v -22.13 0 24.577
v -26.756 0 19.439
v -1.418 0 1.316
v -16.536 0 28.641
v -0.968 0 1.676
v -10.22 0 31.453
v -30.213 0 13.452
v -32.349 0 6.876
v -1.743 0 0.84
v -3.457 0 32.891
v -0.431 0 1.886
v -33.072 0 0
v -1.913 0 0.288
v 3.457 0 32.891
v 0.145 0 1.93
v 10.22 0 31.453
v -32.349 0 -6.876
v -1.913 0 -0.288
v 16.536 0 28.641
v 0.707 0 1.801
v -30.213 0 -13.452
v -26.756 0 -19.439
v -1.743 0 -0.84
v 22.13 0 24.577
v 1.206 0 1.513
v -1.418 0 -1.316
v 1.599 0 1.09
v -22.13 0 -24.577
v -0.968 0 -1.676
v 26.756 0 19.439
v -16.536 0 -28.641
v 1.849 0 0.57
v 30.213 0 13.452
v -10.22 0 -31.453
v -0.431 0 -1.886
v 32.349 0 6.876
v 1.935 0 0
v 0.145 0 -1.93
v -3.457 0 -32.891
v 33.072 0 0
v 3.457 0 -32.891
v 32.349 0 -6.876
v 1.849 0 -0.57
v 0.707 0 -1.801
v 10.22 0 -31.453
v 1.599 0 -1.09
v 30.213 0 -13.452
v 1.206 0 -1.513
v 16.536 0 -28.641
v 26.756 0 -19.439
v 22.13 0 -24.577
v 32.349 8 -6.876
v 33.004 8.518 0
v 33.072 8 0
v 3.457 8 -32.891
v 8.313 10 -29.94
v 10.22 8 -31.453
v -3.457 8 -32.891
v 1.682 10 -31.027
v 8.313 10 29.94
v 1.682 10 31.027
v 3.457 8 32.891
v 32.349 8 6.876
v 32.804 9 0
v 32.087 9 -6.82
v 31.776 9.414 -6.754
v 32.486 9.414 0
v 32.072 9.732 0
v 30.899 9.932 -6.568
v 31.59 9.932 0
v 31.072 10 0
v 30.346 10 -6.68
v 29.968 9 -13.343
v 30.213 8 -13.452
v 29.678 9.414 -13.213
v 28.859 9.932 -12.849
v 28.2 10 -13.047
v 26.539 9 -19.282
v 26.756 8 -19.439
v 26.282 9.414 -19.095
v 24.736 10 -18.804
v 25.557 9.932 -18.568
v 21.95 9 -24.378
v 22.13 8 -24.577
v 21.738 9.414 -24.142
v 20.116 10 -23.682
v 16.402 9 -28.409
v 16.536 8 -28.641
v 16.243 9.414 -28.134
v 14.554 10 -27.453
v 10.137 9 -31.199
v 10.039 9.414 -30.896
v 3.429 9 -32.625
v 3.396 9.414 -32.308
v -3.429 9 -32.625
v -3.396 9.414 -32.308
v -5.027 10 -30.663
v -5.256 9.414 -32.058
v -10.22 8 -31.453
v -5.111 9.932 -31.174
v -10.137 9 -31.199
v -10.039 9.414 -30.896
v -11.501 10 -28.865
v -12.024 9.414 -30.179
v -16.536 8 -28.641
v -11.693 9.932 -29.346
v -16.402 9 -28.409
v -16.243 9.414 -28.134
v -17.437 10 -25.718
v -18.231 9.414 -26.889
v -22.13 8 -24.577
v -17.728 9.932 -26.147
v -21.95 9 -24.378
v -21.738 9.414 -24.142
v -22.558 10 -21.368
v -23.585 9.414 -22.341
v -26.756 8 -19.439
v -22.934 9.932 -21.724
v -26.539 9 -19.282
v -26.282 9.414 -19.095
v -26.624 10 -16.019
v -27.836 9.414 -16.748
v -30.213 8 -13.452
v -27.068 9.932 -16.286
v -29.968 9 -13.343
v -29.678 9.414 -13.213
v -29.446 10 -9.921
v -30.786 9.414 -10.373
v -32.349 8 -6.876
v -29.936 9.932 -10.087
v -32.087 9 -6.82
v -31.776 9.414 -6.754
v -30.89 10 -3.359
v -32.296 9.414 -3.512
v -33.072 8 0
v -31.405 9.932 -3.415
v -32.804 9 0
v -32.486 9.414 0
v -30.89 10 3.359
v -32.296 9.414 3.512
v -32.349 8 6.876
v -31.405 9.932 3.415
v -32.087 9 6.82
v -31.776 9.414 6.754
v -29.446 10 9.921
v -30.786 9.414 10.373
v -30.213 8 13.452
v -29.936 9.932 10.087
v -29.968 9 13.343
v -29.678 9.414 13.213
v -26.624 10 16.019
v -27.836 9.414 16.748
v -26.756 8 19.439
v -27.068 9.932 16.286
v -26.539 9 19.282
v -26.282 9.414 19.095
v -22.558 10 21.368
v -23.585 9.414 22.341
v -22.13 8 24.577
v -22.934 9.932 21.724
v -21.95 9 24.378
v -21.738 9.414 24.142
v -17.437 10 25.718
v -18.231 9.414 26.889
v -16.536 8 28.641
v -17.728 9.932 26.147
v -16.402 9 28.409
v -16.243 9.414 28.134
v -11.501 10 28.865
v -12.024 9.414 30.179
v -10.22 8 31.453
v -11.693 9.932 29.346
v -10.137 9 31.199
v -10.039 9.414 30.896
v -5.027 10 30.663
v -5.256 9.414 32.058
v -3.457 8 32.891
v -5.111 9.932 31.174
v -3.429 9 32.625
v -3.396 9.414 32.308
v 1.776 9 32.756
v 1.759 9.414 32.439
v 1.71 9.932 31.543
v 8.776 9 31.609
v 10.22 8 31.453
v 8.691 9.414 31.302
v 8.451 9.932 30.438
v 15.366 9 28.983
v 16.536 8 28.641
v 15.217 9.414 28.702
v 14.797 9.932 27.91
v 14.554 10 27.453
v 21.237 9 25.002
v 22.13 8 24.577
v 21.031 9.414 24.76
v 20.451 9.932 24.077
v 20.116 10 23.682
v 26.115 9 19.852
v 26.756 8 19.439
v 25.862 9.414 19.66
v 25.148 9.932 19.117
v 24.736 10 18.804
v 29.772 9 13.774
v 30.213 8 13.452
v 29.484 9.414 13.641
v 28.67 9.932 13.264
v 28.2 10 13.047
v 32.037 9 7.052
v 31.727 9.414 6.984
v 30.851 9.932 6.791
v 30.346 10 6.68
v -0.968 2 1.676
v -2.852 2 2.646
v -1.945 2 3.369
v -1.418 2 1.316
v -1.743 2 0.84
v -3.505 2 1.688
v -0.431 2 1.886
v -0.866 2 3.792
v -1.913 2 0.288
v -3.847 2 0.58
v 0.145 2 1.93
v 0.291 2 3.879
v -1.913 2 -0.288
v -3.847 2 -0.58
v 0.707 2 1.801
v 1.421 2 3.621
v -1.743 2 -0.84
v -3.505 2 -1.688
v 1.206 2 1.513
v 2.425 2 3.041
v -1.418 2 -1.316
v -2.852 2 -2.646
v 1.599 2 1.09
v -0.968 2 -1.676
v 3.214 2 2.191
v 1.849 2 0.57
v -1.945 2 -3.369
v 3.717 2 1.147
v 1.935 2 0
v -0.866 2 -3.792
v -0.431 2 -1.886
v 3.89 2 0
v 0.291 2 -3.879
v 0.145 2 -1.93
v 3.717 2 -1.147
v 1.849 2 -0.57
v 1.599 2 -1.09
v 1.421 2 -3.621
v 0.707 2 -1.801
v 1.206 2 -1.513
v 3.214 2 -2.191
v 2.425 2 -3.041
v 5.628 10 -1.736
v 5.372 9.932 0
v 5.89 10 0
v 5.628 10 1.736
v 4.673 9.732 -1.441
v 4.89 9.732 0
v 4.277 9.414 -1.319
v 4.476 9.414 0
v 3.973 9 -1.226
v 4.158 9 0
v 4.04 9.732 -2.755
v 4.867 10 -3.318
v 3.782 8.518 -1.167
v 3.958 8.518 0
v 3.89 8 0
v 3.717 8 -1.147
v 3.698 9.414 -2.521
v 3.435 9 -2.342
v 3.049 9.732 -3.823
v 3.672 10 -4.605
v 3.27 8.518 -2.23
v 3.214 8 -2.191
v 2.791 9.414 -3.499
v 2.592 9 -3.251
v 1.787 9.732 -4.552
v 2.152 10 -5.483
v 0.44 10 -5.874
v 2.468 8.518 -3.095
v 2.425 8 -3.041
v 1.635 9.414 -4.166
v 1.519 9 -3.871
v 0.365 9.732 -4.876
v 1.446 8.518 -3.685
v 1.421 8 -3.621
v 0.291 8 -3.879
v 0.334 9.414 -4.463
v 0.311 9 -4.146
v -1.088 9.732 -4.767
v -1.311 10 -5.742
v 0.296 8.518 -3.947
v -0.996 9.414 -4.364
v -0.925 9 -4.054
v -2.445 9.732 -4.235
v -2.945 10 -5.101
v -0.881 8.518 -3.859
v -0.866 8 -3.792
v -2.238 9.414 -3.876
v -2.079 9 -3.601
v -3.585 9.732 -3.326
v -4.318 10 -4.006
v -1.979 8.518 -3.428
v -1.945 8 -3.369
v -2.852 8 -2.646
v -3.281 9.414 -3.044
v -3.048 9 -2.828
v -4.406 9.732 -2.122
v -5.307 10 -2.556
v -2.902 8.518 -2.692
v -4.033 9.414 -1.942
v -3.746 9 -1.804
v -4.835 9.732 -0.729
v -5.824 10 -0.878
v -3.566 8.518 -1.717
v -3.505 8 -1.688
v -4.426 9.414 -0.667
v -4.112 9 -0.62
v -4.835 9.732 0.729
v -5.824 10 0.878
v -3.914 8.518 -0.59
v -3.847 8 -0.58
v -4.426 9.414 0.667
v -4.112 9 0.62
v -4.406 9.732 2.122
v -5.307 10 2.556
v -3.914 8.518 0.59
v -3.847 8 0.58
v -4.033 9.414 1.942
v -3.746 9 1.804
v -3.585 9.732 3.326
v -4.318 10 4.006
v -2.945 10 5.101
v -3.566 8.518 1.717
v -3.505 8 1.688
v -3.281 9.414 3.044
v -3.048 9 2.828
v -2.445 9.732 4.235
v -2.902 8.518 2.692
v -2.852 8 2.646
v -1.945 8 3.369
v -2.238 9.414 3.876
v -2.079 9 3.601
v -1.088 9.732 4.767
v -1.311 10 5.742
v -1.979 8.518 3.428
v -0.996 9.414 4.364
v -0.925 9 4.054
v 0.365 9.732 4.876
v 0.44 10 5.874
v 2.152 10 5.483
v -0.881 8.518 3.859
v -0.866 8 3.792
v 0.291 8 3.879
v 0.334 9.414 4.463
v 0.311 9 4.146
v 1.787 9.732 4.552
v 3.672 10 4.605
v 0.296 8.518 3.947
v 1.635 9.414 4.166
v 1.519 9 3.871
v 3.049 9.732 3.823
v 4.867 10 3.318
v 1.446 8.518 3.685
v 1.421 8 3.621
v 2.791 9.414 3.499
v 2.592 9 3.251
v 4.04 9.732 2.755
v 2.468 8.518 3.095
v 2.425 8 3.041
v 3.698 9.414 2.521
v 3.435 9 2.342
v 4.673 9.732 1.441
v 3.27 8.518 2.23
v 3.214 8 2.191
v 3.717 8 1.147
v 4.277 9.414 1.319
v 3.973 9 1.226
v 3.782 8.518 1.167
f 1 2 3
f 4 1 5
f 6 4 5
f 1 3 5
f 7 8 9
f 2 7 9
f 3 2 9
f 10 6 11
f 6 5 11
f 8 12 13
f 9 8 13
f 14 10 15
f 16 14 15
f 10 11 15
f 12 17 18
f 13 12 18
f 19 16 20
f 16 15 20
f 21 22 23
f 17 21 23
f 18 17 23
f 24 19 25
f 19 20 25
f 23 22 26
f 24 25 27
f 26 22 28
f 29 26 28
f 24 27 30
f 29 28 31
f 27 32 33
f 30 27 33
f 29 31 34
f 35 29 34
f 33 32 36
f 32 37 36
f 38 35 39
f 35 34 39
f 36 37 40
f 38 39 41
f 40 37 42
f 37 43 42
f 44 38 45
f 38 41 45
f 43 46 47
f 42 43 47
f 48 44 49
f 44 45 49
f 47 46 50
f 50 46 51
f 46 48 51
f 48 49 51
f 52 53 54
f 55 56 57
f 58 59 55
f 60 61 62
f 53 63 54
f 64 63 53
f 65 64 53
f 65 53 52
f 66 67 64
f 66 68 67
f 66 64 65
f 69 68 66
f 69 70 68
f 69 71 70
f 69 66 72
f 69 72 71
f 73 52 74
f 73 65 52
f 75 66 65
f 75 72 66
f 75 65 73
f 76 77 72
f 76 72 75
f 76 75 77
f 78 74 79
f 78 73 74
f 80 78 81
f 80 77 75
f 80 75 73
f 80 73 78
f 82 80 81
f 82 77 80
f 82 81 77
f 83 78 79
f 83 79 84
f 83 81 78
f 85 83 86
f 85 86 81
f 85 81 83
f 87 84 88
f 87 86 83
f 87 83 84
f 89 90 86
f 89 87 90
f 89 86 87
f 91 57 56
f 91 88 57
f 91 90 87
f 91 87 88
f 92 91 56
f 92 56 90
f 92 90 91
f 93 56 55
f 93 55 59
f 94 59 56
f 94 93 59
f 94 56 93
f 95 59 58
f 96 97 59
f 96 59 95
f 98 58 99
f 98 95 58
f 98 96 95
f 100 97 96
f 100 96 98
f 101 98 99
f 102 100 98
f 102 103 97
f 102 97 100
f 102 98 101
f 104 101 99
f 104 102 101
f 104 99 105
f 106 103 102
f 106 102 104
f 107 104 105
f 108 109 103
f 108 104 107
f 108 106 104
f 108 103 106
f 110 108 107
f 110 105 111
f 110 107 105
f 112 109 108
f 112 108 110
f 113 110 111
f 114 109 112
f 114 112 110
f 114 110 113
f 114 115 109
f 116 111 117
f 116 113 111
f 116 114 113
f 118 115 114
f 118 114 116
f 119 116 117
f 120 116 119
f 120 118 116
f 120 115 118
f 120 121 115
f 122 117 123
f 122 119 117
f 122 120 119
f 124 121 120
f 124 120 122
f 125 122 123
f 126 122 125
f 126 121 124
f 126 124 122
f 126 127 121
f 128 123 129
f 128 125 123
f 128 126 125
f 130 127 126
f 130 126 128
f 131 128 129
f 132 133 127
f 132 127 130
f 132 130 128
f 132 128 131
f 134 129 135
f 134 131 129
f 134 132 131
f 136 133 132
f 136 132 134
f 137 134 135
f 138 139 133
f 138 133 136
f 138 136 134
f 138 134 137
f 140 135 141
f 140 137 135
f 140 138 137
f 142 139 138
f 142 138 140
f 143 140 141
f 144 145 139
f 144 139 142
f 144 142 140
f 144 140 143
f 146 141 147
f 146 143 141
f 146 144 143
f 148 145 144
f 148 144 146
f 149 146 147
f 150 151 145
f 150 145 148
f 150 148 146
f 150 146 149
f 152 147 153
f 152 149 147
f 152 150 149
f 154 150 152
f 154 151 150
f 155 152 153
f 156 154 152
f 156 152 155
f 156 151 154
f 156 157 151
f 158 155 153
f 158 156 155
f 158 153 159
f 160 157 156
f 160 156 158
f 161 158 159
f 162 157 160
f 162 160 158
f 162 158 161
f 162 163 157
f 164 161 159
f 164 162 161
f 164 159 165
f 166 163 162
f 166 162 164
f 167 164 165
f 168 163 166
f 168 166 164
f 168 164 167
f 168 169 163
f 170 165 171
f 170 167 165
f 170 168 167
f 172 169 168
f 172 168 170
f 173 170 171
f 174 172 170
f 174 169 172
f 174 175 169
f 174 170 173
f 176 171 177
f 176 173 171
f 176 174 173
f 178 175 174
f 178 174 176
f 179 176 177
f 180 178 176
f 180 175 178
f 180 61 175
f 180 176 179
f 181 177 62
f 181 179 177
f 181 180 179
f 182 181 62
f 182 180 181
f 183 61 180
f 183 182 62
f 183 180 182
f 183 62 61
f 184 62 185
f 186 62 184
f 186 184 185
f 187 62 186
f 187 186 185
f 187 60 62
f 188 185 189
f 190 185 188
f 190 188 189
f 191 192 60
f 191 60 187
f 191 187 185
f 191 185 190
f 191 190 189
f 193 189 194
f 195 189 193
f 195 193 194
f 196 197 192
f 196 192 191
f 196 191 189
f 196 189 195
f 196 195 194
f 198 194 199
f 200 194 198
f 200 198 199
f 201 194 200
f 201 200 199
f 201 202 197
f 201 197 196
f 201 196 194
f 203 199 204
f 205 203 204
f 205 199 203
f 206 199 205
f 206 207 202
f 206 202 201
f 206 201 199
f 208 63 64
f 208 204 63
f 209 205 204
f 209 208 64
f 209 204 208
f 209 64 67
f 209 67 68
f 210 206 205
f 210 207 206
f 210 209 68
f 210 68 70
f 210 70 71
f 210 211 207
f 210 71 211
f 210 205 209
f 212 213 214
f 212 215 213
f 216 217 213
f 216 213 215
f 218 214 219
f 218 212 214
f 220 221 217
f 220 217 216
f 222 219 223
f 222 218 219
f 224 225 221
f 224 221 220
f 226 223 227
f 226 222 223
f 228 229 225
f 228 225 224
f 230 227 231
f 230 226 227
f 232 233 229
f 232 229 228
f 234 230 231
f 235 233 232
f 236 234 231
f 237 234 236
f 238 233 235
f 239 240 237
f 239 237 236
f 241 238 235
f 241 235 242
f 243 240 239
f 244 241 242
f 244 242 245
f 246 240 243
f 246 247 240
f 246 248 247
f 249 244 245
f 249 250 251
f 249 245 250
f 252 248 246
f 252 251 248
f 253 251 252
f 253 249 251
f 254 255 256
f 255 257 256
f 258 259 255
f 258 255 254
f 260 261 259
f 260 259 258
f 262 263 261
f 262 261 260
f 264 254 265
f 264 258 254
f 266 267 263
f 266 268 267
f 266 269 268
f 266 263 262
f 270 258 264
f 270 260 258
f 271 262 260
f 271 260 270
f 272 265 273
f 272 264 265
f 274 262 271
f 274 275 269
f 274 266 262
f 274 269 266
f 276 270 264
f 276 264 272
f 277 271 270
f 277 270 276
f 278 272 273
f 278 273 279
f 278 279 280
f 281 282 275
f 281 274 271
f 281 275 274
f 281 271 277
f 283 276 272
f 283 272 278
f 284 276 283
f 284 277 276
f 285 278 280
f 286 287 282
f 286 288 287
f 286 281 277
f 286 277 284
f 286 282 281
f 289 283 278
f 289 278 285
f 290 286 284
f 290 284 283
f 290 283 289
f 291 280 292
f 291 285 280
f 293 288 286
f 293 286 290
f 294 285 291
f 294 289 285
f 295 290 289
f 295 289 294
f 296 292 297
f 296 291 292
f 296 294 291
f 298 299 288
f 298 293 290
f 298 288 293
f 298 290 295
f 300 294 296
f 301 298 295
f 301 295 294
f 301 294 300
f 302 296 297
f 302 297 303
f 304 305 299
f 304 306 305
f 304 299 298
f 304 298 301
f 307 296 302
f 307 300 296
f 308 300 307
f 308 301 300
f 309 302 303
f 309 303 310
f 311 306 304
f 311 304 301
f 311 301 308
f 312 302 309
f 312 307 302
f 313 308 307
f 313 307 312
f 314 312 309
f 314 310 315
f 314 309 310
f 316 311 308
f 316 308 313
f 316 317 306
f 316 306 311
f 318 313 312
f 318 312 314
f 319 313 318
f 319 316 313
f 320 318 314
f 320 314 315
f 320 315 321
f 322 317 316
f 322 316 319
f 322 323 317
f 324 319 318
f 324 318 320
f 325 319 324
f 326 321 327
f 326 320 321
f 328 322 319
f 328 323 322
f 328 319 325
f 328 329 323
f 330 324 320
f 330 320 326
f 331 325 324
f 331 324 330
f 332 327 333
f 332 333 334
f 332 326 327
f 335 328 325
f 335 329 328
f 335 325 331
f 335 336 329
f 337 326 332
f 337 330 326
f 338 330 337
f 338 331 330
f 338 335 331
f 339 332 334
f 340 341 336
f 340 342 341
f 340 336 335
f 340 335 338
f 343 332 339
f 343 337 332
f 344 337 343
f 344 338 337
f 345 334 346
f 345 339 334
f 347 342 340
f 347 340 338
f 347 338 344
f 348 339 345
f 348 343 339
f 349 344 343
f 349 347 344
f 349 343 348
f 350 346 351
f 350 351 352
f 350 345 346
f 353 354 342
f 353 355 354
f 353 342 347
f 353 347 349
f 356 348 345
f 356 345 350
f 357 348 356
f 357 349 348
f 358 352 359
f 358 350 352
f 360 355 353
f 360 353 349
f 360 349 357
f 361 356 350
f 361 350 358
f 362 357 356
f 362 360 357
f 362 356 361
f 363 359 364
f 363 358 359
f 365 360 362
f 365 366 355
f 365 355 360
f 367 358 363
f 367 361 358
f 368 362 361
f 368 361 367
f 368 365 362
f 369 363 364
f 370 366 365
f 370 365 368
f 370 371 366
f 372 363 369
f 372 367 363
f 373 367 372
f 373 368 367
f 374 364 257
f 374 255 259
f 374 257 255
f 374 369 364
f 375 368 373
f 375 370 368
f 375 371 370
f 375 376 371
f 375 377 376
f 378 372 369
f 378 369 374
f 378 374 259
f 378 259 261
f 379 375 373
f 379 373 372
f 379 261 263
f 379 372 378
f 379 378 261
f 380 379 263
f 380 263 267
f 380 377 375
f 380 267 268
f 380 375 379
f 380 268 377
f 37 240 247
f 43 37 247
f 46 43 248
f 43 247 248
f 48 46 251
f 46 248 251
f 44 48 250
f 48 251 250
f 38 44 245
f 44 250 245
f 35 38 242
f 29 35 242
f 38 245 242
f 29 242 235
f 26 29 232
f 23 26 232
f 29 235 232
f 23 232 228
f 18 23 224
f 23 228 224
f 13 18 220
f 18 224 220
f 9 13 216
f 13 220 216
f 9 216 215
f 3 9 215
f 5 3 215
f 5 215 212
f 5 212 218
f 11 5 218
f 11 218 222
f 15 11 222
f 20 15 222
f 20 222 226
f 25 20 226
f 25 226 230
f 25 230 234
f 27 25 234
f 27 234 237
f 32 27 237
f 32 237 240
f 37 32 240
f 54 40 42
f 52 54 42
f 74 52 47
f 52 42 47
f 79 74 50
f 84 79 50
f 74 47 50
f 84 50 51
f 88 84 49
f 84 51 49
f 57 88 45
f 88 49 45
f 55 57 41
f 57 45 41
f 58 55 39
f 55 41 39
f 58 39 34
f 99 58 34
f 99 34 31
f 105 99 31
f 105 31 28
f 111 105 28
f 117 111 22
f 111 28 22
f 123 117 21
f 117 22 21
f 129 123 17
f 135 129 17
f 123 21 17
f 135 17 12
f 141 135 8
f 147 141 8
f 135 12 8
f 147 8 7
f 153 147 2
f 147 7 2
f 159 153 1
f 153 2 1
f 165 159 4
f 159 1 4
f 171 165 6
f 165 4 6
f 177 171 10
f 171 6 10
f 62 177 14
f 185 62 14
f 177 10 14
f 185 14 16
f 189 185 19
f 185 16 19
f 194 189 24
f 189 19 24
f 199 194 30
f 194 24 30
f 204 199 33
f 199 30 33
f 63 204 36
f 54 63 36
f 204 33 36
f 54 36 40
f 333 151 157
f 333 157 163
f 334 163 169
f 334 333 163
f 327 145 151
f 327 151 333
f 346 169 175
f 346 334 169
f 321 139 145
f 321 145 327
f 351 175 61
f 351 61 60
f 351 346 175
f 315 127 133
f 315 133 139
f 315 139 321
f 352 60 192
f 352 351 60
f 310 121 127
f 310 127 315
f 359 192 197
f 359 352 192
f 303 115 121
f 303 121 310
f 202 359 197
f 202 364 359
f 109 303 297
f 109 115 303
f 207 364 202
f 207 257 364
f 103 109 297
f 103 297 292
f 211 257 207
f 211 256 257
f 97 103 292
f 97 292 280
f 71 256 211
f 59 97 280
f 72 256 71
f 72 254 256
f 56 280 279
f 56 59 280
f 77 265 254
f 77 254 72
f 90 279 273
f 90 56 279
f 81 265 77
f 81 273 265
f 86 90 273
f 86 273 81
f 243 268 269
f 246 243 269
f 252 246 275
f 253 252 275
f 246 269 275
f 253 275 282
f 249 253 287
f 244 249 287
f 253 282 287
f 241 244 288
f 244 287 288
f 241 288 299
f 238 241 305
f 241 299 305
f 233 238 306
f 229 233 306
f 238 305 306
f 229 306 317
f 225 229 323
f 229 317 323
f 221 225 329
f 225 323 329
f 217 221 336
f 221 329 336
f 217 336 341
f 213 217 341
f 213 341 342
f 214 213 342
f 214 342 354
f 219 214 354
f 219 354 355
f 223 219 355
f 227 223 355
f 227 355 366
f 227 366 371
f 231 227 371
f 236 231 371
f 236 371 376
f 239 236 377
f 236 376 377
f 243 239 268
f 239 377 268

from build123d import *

# Parameters (mm, degrees)
SKETCH1_R           = 33.072163115
BOSS_EXTRUDE1_DEPTH = 10
SKETCH2_R           = 3.89
CUT_EXTRUDE1_DEPTH  = 8
SKETCH3_R           = 1.935
CUT_EXTRUDE2_DEPTH  = 8
FILLET1_R           = 2
FILLET2_R           = 2


with BuildPart() as part:
    # Sketch1 → Boss-Extrude1 (new body)
    with BuildSketch(Plane(origin=(0, 0, 0), x_dir=(1, 0, 0), z_dir=(0, 1, 0))):
        Circle(SKETCH1_R)
    extrude(amount=BOSS_EXTRUDE1_DEPTH)

    # Sketch2 → Cut-Extrude1 (cut)
    with BuildSketch(Plane(origin=(0, 10, 0), x_dir=(1, 0, 0), z_dir=(0, 1, 0))):
        Circle(SKETCH2_R)
    extrude(amount=-CUT_EXTRUDE1_DEPTH, mode=Mode.SUBTRACT)

    # Sketch3 → Cut-Extrude2 (cut)
    with BuildSketch(Plane(origin=(0, 2, 0), x_dir=(1, 0, 0), z_dir=(0, 1, 0))):
        Circle(SKETCH3_R)
    extrude(amount=-CUT_EXTRUDE2_DEPTH, mode=Mode.SUBTRACT)

    # Fillet1
    fillet1_edges = [part.edges().sort_by_distance(p)[0] for p in [
        (-33.072163115, 10, 0),
    ]]
    fillet(fillet1_edges, radius=FILLET1_R)

    # Fillet2
    fillet2_edges = [part.edges().sort_by_distance(p)[0] for p in [
        (-3.89, 10, 0),
    ]]
    fillet(fillet2_edges, radius=FILLET2_R)


solid = part.part
